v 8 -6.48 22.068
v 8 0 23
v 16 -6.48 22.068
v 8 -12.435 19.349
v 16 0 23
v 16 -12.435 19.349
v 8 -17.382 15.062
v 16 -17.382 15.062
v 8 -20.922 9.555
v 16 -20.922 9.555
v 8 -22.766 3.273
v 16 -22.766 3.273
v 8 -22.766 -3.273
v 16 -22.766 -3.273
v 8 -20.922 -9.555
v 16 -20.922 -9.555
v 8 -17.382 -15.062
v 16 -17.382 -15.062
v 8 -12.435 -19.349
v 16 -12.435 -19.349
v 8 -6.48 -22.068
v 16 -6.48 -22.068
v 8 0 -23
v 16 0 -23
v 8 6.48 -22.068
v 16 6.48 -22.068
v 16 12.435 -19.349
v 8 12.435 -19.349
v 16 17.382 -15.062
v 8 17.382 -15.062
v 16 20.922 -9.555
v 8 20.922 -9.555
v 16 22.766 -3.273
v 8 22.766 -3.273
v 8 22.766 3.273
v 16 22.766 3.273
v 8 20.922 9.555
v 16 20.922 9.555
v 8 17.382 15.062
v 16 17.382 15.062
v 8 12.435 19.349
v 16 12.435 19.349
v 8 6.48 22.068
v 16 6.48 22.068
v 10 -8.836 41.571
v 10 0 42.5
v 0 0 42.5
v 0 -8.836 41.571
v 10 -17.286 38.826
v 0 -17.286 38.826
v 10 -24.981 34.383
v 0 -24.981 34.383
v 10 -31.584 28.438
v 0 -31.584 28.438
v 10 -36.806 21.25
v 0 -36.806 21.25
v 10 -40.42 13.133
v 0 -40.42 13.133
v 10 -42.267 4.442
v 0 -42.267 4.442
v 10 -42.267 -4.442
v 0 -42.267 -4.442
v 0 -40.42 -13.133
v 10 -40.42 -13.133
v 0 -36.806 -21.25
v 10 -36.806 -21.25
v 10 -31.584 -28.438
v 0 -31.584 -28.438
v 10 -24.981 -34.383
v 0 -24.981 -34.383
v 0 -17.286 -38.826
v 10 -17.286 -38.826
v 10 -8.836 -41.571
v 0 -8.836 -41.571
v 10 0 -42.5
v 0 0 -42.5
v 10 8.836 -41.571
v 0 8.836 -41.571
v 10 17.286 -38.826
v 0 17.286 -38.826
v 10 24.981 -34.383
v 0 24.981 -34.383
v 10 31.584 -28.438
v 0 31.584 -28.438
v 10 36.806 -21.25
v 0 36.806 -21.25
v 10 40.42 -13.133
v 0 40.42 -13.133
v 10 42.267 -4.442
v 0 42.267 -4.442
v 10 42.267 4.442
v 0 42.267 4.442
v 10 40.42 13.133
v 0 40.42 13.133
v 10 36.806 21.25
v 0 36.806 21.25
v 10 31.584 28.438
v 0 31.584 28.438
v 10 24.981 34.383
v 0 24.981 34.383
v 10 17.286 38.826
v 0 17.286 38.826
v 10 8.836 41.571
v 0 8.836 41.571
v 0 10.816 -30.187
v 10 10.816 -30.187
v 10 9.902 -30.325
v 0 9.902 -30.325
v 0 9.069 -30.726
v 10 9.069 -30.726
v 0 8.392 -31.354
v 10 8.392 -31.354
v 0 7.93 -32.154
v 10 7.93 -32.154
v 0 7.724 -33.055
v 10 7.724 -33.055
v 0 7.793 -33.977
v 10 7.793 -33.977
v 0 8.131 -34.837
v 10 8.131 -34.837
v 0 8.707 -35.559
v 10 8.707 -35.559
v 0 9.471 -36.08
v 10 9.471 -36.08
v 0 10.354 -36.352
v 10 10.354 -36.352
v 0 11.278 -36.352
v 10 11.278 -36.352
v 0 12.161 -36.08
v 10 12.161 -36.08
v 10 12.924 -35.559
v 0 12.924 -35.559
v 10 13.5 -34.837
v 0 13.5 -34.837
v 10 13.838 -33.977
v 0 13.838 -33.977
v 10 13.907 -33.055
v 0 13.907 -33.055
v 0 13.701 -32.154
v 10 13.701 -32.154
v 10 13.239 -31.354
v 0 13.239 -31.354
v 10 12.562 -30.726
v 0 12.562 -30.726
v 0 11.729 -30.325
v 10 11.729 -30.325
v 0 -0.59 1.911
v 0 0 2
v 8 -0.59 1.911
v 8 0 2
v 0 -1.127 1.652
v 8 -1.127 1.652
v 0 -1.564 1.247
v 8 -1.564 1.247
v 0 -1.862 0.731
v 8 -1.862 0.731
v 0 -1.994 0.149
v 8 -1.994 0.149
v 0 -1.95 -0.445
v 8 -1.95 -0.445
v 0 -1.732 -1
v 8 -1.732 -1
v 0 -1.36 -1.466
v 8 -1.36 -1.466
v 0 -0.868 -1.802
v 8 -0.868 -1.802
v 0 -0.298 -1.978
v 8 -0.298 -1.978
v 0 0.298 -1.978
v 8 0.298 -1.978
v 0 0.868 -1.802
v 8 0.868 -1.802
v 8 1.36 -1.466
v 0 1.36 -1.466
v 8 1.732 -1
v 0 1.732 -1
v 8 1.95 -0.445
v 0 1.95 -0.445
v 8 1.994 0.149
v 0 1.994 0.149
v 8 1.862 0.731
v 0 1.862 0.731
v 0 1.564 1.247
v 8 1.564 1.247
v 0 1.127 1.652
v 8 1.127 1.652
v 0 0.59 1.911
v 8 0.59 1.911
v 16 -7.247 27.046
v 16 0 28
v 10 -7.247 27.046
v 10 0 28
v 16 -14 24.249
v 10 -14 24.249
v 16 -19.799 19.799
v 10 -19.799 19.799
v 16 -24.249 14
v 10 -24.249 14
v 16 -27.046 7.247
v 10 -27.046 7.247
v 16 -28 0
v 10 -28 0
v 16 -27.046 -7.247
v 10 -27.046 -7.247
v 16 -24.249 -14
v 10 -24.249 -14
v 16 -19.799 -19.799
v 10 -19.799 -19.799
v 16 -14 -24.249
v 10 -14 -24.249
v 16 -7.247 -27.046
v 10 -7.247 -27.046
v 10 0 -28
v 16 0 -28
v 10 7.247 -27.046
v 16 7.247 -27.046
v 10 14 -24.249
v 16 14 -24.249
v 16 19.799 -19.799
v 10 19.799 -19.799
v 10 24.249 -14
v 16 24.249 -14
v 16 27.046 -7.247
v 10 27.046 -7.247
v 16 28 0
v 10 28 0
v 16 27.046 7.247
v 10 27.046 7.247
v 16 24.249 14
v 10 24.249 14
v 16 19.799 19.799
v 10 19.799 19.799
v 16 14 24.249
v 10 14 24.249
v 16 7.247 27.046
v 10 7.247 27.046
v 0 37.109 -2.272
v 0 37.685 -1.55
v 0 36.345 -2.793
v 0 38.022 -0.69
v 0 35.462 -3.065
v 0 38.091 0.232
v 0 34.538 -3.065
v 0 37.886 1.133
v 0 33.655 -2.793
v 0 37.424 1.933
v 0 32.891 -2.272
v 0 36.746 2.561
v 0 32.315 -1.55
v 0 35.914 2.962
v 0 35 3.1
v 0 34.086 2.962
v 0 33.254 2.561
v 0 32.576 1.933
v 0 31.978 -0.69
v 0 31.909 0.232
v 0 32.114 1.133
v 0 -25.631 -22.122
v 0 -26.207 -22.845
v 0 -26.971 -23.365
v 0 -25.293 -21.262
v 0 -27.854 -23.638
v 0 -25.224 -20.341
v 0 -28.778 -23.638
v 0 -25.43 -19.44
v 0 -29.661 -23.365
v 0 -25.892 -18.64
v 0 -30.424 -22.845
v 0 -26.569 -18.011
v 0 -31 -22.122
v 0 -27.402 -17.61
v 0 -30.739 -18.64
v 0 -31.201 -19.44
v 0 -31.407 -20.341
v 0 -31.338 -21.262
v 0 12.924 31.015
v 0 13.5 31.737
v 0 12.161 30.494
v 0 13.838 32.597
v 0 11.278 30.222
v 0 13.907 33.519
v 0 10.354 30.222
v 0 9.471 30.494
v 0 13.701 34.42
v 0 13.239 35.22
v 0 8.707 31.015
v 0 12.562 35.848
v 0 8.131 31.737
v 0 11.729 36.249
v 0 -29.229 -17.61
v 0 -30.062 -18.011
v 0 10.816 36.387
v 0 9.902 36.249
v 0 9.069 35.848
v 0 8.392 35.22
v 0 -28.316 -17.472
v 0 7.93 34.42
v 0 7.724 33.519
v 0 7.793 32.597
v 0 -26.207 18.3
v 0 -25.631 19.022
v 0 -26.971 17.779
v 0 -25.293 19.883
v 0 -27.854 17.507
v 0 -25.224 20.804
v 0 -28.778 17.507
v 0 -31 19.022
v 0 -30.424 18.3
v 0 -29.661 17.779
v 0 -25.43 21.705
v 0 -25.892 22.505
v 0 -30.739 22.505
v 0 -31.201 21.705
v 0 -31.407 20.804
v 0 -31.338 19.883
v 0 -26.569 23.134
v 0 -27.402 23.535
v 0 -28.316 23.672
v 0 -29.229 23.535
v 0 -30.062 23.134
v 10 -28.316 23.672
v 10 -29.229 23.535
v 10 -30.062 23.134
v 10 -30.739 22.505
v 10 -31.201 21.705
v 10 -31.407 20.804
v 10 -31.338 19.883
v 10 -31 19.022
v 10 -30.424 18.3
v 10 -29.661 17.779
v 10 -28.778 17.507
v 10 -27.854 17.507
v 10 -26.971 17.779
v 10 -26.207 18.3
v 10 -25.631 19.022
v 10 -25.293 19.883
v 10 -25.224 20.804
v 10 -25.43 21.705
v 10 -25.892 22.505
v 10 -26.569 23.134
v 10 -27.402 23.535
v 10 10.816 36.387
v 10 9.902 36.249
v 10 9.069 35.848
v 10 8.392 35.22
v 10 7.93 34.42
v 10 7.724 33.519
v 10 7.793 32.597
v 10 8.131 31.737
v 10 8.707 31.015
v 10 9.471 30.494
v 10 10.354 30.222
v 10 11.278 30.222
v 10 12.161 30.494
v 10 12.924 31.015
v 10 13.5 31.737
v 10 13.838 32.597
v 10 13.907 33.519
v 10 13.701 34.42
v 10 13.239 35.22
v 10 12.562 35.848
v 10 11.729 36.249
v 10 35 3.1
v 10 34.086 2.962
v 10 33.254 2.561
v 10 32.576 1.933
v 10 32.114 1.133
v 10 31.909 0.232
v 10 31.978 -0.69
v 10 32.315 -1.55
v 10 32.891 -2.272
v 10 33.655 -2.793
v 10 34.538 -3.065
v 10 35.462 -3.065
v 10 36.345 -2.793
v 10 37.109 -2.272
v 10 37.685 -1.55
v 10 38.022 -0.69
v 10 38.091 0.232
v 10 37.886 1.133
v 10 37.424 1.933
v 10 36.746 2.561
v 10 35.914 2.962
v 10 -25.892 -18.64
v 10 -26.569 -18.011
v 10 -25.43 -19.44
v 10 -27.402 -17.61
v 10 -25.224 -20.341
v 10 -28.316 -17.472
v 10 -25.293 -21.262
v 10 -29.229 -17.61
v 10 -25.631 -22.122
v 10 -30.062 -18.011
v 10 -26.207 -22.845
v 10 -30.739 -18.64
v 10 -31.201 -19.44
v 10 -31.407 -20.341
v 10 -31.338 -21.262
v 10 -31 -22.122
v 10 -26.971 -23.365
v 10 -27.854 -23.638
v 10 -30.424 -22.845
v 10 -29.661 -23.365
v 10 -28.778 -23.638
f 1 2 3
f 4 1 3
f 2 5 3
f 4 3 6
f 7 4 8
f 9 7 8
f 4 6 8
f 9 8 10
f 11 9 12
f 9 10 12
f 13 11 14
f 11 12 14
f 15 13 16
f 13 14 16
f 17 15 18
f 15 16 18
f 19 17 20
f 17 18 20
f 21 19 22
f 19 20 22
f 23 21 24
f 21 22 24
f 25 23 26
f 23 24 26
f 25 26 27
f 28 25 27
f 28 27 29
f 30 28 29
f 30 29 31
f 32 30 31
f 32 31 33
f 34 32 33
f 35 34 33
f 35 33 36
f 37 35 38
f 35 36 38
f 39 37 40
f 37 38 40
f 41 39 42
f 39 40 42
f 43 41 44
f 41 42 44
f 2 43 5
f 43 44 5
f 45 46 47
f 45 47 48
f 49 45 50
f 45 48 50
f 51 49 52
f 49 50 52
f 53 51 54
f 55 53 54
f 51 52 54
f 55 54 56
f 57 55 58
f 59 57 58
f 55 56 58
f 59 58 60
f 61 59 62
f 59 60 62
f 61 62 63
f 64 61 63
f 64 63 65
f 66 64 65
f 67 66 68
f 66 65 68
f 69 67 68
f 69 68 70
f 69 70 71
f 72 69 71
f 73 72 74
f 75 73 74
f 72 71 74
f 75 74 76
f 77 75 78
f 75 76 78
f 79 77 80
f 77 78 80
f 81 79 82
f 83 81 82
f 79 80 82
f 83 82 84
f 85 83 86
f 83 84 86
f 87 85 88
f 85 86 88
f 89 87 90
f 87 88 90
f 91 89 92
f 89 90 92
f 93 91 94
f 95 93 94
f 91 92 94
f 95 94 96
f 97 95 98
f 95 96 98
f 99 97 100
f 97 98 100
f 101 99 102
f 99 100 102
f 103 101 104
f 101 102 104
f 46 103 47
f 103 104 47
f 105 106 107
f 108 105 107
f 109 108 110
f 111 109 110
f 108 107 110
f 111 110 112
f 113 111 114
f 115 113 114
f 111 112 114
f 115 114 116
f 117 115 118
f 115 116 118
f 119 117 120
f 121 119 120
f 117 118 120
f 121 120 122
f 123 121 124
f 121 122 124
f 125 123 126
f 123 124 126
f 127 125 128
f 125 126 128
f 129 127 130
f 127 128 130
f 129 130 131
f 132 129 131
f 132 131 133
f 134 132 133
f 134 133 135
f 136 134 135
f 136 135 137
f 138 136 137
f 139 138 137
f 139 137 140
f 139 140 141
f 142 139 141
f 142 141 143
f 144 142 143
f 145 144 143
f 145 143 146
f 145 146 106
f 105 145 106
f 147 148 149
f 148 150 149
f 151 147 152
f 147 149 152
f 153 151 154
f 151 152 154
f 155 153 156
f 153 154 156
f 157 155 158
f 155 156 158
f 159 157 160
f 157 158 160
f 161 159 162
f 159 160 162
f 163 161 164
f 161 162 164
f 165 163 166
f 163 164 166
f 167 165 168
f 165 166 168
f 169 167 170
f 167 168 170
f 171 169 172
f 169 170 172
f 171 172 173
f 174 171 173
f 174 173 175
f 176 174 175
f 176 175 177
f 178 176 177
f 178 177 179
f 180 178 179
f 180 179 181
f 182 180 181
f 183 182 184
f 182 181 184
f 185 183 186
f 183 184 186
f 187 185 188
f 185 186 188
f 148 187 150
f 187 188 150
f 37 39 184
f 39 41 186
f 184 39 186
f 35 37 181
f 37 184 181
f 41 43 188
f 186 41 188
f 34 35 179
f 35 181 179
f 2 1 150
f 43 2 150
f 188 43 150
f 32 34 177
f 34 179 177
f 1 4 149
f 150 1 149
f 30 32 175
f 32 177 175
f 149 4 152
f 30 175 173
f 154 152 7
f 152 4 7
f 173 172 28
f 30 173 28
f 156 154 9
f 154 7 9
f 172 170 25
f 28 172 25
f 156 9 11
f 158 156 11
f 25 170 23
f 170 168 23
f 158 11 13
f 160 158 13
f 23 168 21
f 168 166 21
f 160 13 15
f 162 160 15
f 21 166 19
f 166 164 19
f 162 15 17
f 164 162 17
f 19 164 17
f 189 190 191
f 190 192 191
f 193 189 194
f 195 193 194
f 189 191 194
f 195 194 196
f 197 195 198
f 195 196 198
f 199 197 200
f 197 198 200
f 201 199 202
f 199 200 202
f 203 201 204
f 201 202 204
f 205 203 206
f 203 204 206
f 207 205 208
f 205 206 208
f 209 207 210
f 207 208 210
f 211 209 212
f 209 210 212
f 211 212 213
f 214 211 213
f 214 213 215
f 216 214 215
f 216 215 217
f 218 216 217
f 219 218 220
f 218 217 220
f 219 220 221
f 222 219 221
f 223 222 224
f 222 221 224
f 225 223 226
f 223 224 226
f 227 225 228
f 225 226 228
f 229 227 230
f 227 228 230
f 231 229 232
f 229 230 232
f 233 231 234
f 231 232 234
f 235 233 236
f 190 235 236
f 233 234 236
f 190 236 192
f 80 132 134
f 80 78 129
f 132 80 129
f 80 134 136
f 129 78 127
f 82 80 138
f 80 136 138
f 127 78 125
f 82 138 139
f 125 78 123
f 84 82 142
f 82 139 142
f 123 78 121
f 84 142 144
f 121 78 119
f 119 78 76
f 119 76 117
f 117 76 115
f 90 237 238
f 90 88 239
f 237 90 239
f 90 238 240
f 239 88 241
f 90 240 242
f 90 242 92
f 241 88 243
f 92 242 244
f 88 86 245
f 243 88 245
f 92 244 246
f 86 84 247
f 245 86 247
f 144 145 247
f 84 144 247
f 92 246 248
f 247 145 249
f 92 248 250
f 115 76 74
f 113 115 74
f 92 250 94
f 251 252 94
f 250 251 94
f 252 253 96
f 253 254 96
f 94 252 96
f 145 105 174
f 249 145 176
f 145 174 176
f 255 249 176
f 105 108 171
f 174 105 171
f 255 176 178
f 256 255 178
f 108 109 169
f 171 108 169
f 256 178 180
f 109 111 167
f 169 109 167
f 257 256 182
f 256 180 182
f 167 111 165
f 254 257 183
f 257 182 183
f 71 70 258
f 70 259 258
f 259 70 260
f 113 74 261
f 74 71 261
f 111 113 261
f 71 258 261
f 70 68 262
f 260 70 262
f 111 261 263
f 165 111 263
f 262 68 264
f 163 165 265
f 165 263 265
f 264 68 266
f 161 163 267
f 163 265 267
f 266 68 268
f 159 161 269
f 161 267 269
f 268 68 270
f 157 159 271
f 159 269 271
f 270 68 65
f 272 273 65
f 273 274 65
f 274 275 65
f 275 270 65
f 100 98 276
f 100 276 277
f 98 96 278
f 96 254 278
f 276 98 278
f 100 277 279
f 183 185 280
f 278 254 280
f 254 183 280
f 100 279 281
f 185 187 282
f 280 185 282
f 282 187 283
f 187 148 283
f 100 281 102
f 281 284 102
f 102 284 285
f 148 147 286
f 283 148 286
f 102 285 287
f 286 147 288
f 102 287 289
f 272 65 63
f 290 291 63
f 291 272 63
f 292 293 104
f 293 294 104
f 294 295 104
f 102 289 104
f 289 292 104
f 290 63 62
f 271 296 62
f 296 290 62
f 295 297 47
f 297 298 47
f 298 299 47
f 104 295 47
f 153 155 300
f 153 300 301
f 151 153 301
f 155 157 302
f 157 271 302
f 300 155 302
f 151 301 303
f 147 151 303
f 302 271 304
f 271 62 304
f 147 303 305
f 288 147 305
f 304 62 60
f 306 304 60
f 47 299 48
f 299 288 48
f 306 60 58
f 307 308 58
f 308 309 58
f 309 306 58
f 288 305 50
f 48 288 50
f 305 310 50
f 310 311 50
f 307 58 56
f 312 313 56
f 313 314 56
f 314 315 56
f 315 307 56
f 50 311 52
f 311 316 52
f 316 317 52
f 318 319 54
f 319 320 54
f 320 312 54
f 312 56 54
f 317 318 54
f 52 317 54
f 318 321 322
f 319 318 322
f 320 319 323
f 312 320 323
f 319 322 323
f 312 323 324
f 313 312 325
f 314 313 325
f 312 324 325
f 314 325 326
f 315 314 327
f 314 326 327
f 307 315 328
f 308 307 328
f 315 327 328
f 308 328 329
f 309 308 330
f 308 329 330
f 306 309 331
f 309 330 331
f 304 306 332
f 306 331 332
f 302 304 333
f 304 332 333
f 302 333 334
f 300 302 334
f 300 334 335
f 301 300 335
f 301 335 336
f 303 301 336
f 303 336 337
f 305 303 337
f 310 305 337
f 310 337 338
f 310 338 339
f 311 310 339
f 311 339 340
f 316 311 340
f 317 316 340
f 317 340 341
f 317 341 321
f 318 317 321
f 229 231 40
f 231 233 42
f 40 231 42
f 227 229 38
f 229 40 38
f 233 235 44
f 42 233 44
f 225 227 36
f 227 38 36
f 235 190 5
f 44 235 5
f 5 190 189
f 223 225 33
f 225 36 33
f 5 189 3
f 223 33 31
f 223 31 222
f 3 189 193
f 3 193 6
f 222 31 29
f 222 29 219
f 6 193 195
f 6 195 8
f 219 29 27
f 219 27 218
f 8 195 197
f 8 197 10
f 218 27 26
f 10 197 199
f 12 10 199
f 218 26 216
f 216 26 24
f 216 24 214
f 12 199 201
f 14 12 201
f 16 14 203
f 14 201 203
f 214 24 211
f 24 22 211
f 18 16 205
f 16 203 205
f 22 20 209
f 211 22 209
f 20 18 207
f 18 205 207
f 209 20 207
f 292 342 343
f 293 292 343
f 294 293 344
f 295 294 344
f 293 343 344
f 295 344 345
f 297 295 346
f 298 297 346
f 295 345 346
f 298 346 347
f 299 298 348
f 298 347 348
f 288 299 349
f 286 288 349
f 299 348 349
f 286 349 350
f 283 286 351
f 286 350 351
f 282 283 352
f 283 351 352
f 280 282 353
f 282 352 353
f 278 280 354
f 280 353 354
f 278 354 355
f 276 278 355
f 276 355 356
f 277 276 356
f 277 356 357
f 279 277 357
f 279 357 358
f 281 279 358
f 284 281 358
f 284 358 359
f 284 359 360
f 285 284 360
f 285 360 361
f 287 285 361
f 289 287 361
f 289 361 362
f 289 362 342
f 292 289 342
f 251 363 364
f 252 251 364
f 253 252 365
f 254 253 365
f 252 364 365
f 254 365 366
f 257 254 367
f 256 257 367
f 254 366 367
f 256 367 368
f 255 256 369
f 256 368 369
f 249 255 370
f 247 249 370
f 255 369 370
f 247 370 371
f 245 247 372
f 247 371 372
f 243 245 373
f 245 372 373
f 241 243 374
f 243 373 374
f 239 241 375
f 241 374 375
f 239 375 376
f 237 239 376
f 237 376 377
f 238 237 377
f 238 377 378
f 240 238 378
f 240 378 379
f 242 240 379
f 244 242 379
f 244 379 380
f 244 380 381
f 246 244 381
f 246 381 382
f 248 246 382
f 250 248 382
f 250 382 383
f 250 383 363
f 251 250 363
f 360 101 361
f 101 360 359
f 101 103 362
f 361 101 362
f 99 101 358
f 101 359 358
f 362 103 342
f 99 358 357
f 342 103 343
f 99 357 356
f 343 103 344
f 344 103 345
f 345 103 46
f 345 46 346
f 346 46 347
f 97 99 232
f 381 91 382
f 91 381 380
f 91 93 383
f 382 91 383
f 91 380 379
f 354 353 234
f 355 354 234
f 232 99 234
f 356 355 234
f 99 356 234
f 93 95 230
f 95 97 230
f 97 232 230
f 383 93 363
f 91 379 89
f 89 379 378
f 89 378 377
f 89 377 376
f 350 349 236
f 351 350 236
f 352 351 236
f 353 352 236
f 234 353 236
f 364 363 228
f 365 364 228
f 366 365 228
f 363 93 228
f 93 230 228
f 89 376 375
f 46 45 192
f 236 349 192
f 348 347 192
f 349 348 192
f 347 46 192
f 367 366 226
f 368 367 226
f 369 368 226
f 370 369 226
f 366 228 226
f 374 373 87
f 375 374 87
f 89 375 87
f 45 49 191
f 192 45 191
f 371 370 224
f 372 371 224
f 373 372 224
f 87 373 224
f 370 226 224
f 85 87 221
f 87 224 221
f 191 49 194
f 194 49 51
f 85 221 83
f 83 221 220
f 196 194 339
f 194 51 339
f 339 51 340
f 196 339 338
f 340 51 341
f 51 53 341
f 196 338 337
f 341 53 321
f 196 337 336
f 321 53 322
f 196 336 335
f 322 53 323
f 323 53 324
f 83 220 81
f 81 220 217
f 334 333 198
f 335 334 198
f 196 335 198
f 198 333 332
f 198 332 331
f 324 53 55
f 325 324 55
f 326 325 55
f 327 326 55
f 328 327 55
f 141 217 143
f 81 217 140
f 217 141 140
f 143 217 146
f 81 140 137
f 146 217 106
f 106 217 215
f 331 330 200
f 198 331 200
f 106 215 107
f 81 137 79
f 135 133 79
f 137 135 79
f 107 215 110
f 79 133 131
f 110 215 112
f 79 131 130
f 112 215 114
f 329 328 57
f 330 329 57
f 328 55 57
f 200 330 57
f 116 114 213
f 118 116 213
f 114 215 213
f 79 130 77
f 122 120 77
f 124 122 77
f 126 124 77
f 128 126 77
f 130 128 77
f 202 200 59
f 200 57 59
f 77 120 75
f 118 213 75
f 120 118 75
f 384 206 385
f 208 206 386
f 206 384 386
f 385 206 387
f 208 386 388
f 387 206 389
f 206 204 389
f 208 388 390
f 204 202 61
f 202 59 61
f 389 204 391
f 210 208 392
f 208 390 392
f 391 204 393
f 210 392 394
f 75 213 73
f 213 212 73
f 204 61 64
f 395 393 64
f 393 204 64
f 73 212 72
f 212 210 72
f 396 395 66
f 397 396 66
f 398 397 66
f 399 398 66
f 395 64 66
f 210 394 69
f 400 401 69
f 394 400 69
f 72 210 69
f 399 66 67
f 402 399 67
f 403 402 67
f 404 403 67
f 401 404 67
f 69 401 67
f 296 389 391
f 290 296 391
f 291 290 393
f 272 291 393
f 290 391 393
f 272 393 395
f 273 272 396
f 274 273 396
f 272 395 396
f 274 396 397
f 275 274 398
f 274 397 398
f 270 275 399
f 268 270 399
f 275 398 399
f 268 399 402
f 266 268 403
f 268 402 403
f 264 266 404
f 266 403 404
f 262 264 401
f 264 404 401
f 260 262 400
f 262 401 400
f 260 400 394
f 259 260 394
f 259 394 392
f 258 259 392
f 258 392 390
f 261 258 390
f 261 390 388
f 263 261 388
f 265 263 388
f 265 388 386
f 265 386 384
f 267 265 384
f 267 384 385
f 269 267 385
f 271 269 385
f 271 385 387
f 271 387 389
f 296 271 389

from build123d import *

# Parameters (mm, degrees)
HOLE_WIZARD_6_0_6_1_D = 6.2


with BuildPart() as part:
    # Эскиз1 → Повернуть1 (revolve)
    with BuildSketch(Plane.XY, mode=Mode.PRIVATE) as revolve_1_sk:
        Polygon((0, -2), (8, -2), (8, -23), (16, -23), (16, -28), (10, -28), (10, -42.5), (0, -42.5), align=None)
    revolve(revolve_1_sk.sketch.rotate(Axis((-696.045801993, 0, 0), (1, 0, 0)), 270), axis=Axis((-696.045801993, 0, 0), (1, 0, 0)))

    # Диаметр отверстия Ø6.0 (6)1 (through all)
    with Locations(Plane(origin=(0, 10.815594803, -33.28697807), x_dir=(0, 0, -1), z_dir=(-1, 0, 0))):
        with Locations((0, 0), (-66.57395614, 0), (-33.28697807, -24.184405197), (-12.71449424, 39.131189606), (-53.8594619, 39.131189606)):
            Hole(HOLE_WIZARD_6_0_6_1_D / 2)


solid = part.part
